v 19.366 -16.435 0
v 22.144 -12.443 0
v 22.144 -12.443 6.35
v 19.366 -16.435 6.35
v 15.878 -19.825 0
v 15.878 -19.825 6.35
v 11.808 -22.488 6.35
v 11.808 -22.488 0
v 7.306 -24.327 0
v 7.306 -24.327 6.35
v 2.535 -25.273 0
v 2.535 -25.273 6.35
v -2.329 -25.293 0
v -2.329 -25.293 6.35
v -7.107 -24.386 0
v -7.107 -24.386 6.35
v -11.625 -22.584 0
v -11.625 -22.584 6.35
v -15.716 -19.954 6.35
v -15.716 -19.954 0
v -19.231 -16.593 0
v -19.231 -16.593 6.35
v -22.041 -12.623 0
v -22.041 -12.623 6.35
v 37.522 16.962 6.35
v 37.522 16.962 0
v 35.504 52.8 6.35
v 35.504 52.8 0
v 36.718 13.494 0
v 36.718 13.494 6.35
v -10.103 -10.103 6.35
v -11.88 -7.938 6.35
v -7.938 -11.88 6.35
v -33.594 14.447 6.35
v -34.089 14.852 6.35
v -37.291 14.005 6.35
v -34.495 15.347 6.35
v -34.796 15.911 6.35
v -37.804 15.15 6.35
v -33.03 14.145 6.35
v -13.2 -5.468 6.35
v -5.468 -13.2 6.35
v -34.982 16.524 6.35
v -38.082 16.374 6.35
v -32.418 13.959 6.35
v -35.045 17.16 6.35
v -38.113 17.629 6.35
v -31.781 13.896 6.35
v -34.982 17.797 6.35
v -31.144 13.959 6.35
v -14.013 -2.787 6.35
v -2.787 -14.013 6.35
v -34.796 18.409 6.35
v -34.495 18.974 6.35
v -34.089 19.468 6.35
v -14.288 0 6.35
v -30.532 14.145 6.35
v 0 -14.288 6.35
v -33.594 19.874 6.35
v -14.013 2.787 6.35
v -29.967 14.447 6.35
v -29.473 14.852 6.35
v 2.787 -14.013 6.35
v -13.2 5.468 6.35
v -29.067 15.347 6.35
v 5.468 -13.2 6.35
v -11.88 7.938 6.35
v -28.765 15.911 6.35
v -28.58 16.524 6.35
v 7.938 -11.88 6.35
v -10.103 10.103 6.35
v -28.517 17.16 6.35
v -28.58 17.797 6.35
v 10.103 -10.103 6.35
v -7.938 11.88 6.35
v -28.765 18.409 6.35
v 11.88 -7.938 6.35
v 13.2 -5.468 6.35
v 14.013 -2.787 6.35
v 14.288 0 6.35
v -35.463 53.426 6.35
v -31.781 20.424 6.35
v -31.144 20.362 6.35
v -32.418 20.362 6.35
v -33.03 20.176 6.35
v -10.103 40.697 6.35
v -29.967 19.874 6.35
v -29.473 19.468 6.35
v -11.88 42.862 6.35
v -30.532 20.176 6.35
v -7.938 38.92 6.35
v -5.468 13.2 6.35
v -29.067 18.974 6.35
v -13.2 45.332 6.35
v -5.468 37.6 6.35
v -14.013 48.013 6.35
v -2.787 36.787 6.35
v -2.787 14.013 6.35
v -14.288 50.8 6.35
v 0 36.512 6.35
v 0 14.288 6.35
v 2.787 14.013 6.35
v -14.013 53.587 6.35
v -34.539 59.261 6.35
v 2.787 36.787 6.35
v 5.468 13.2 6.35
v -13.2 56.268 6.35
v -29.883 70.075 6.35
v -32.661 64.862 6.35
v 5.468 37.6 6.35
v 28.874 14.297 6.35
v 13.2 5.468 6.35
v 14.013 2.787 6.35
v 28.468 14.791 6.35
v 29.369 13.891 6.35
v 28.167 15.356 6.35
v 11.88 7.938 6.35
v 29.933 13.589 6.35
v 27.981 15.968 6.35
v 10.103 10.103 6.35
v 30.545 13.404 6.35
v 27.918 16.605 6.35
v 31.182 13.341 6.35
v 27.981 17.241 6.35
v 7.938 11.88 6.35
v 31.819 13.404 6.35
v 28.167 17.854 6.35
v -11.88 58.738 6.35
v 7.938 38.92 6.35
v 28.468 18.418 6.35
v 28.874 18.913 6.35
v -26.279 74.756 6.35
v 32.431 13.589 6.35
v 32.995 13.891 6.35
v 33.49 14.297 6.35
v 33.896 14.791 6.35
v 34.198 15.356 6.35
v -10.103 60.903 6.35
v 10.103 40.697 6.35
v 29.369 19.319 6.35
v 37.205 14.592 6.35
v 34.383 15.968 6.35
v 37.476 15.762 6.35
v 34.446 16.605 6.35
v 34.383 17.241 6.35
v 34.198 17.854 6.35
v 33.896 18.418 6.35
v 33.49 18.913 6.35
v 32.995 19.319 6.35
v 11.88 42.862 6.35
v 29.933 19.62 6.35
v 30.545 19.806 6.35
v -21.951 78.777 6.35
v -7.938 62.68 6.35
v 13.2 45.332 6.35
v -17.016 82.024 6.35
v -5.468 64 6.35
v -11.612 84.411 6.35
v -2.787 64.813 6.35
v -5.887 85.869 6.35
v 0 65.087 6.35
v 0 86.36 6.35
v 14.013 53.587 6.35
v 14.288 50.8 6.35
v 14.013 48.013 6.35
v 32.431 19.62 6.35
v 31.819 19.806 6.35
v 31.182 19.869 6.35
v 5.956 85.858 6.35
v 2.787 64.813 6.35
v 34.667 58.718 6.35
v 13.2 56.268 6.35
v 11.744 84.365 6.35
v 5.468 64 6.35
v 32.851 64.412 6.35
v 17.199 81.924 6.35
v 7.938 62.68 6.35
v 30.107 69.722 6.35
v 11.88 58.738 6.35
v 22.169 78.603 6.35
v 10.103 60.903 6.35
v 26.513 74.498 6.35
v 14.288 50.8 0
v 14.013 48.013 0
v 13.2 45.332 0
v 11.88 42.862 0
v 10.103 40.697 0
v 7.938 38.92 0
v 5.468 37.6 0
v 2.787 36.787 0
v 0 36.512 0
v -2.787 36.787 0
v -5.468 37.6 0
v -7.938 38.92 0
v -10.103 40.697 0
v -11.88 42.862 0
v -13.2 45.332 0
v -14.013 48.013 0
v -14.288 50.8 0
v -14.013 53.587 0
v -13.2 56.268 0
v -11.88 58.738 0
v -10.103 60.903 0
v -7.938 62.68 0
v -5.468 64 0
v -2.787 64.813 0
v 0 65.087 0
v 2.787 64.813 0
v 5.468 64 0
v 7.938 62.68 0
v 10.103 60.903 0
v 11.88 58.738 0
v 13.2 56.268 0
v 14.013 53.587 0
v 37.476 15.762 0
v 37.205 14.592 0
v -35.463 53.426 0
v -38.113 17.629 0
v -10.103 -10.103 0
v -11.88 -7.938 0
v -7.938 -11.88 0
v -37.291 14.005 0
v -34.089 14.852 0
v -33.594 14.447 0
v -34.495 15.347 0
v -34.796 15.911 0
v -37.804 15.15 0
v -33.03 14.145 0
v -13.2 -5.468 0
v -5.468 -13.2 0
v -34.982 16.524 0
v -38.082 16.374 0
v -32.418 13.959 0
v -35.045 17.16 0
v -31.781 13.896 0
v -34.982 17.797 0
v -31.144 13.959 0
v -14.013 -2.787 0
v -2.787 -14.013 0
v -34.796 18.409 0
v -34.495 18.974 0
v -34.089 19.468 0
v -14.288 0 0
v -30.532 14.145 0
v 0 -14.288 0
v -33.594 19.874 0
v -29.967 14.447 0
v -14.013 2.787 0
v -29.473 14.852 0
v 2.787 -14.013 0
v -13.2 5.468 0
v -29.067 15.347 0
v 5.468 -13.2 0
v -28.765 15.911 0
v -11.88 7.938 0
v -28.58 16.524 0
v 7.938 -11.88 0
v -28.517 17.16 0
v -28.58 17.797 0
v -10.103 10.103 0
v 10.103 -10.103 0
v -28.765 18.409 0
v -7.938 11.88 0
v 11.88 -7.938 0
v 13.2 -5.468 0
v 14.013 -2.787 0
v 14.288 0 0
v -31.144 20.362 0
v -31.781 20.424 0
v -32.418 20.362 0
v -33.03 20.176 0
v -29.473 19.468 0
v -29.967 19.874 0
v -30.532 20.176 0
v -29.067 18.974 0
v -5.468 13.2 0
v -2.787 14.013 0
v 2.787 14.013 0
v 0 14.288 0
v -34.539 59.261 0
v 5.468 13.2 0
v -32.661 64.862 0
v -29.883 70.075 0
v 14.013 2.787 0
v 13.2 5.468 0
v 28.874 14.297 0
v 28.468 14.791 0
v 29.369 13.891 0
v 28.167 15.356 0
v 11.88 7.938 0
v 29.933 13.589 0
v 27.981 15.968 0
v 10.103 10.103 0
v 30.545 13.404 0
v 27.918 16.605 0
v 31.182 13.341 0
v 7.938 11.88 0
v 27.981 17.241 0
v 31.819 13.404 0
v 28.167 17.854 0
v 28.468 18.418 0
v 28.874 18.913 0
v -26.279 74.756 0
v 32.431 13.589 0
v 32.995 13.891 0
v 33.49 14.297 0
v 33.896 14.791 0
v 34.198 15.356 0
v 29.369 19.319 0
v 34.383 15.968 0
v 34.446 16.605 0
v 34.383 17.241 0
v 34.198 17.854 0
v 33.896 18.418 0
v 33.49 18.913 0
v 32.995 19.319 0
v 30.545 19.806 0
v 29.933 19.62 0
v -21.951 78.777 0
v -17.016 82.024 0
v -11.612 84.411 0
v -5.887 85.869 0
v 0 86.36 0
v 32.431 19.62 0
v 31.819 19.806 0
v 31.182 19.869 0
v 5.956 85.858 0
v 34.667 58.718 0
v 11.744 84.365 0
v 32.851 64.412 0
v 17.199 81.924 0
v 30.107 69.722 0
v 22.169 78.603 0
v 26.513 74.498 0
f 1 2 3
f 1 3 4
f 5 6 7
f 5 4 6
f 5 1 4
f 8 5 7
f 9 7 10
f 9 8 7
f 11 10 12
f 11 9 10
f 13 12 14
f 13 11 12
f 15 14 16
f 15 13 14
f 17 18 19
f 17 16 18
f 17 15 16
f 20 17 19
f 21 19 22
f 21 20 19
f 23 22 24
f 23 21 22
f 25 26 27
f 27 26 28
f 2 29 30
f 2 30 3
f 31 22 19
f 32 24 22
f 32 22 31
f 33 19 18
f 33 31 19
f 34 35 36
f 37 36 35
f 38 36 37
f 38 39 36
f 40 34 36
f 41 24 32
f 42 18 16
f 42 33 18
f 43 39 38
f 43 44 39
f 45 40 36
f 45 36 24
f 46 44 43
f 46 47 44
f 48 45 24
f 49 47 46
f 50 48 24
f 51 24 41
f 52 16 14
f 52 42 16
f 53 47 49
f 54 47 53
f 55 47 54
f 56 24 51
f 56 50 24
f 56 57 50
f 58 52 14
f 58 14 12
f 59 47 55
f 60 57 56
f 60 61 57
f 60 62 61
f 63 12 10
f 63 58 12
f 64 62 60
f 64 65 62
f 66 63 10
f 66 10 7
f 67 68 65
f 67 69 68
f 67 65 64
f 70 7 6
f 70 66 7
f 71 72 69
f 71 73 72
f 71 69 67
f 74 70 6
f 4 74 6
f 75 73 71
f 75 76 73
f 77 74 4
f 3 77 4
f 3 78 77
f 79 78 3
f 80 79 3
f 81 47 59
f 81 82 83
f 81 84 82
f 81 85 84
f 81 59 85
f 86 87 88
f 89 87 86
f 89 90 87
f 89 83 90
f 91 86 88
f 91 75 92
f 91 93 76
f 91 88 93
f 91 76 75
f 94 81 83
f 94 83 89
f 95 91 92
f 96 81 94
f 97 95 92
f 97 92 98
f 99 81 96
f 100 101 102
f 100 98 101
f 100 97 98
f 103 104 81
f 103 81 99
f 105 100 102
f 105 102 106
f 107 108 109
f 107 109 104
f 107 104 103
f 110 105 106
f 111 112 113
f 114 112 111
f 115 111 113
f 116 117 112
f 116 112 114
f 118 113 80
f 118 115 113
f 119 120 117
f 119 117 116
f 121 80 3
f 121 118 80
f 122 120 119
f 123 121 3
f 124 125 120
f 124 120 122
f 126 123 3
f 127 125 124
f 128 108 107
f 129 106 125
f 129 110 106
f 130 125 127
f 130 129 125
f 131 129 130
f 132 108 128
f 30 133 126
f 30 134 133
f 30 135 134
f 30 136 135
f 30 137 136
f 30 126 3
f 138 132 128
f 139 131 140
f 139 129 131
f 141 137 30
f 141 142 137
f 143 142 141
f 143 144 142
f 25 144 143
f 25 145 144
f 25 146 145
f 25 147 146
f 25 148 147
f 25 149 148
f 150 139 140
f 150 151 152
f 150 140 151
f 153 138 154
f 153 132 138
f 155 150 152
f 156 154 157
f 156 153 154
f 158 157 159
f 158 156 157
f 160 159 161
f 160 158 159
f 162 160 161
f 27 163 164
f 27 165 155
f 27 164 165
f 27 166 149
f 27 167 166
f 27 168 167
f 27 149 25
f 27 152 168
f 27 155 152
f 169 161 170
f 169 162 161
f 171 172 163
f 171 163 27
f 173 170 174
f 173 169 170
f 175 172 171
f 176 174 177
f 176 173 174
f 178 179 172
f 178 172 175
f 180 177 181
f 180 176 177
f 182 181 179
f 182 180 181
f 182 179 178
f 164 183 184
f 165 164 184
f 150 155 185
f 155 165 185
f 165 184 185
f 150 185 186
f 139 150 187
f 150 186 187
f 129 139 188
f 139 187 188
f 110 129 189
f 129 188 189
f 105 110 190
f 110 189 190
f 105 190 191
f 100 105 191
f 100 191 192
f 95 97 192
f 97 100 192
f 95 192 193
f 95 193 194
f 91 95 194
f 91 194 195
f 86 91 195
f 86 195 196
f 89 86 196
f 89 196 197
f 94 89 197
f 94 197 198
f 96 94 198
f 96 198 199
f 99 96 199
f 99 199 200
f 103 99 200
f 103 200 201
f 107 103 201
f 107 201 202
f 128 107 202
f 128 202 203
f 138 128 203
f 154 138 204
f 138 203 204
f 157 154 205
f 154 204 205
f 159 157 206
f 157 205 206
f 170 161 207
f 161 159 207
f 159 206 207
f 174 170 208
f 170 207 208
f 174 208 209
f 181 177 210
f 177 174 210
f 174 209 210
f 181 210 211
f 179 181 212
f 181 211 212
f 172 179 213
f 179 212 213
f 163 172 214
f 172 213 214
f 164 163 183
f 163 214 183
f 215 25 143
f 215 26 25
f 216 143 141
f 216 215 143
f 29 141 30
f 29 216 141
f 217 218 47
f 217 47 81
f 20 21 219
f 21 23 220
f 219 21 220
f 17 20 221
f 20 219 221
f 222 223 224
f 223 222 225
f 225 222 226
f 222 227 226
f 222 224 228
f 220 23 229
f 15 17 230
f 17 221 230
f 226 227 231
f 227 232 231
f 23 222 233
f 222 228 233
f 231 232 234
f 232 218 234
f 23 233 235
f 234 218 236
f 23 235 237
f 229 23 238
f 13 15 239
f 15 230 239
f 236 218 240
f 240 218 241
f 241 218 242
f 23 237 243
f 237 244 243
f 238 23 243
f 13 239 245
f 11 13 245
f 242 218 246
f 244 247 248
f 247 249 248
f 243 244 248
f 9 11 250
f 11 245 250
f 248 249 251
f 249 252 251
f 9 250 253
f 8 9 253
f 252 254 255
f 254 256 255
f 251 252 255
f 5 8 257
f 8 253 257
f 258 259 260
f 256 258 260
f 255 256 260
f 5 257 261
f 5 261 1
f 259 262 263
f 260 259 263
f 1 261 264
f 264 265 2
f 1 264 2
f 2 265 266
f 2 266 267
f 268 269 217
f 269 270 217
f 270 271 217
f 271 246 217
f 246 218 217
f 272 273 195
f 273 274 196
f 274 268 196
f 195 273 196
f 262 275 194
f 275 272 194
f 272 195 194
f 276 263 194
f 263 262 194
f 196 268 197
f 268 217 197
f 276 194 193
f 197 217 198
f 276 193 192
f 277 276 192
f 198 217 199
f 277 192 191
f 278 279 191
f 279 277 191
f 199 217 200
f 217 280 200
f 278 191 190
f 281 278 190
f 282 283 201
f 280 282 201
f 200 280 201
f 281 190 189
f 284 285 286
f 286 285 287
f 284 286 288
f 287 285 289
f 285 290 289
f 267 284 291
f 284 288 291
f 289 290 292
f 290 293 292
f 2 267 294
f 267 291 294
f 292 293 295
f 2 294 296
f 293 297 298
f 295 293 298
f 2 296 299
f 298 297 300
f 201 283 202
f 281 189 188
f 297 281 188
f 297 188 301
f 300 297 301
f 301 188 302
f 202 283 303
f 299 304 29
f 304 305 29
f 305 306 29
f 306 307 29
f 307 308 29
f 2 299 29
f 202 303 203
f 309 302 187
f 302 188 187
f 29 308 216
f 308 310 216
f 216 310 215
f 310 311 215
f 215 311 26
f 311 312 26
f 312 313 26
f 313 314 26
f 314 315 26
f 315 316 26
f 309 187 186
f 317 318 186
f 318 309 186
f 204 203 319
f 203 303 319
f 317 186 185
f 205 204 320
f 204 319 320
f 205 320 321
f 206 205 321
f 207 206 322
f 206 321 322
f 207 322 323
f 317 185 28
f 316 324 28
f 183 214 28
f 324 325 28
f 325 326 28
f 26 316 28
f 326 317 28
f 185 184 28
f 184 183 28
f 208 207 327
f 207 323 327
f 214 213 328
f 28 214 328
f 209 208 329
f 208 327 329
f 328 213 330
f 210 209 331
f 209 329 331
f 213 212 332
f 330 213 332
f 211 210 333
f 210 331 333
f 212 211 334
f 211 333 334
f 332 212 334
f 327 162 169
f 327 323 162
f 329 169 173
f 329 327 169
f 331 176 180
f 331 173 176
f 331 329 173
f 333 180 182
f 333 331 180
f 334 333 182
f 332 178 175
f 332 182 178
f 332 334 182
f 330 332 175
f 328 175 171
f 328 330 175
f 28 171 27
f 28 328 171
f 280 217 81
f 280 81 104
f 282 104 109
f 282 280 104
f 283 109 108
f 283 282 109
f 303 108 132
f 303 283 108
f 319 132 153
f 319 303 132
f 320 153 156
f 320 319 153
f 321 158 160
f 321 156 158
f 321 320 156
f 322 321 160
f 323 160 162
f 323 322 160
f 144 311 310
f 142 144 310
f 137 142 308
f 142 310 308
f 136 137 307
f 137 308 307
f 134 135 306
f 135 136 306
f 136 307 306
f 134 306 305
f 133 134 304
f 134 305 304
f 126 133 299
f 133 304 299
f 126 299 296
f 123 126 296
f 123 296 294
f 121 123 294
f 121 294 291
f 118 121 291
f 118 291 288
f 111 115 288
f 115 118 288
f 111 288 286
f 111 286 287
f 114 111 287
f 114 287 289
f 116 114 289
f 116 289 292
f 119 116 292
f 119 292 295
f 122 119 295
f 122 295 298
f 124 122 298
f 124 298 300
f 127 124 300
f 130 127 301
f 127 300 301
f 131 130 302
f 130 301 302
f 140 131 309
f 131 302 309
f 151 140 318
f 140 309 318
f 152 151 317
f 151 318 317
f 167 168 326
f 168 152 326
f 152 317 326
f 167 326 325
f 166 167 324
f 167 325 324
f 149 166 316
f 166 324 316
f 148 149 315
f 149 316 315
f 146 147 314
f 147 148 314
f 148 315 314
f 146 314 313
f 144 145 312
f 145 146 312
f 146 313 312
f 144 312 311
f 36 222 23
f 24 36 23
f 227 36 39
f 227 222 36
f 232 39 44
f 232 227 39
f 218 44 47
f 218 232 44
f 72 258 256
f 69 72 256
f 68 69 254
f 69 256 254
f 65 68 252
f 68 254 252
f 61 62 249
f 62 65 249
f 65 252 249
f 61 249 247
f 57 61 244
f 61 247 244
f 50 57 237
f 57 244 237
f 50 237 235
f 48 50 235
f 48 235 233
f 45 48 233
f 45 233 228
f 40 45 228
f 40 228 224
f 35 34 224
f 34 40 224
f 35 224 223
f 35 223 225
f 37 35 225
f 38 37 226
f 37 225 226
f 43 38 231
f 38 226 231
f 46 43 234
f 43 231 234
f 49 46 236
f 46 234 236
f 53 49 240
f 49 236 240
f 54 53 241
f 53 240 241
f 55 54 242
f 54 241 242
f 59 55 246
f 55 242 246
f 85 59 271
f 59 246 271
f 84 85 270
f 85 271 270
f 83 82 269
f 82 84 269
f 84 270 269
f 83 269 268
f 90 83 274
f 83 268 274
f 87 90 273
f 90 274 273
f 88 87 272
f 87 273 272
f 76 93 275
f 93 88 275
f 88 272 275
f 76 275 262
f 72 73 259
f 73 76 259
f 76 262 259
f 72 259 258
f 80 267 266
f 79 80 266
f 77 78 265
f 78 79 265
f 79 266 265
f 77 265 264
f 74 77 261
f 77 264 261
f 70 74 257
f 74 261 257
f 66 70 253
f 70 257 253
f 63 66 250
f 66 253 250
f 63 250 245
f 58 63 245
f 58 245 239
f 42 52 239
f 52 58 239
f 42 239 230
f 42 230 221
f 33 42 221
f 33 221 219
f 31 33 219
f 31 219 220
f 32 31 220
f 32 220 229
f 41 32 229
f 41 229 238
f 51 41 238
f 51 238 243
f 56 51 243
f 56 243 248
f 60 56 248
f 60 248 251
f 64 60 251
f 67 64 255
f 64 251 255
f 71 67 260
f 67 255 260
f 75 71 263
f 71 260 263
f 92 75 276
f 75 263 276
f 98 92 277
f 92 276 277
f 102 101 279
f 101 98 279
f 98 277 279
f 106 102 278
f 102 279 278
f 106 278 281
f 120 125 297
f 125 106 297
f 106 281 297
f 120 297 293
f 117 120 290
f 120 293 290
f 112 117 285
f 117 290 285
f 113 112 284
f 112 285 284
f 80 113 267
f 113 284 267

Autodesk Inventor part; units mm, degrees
ref_plane "YZ Plane" through (0, 0, 0) normal (1, 0, 0) x (0, 1, 0)
ref_plane "XZ Plane" through (0, 0, 0) normal (0, 1, 0) x (-1, 0, 0)
ref_plane "XY Plane" through (0, 0, 0) normal (0, 0, 1) x (1, 0, 0)
sketch "Sketch1" plane through (0, 0, 0) normal (0, 0, 1) x (1, 0, 0)
  circle A0 centre (0, 0) radius 14.2875
  circle A1 centre (0, 0) radius 20.32 construction
  circle A2 centre (0, 50.8) radius 30.48 construction
  circle A3 centre (0, 50.8) radius 14.2875
  circle A4 centre (0, 50.8) radius 35.56 construction
  line L0 (0, 81.28) -> (0, 86.36)
  circle A5 centre (0, 0) radius 25.4 construction
  line L1 (0, 20.32) -> (0, 25.4) construction
  circle A6 centre (-31.7808, 17.1604) radius 6.35 construction
  circle A7 centre (31.1821, 16.6047) radius 6.35 construction
  line L2 (-27.42, 21.7763) -> (-24.4204, 24.9513) construction
  line L3 (-26.1933, 14.1434) -> (-22.3499, 12.0681) construction
  line L4 (26.8213, 11.9889) -> (23.8217, 8.8139) construction
  line L5 (26.9034, 21.2968) -> (23.9604, 24.5243) construction
  circle A8 centre (-31.7808, 17.1604) radius 3.2639
  circle A9 centre (31.1821, 16.6047) radius 3.2639
  line L6 (-37.2911, 14.0047) -> (-22.0413, -12.6231)
  line L7 (36.718, 13.494) -> (22.1435, -12.4429)
  line L8 (-38.1134, 17.6293) -> (-35.4629, 53.4258)
  line L9 (37.522, 16.9618) -> (35.5037, 52.7995)
  arc A10 (-38.1134, 17.6293) -> (-37.2911, 14.0047) centre (-31.7808, 17.1604) ccw
  arc A11 (36.718, 13.494) -> (37.522, 16.9618) centre (31.1821, 16.6047) ccw
  arc A12 (35.5037, 52.7995) -> (-35.4629, 53.4258) centre (0, 50.8) ccw
  arc A13 (-22.0413, -12.6231) -> (22.1435, -12.4429) centre (0, 0) ccw
  dimension "d1" = 40.64
  dimension "d0" = 28.575
  dimension "d2" = 60.96
  dimension "d3" = 28.575
  dimension "d4" = 5.08
  dimension "d5" = 71.12
  dimension "d6" = 5.08
  dimension "d9" = 12.7
  dimension "d10" = 3.175
  dimension "d11" = 6.5278
  dimension "d12" = 6.5278
extrude "Extrusion2" add sketch "Sketch1" along normal blind 6.35
properties part number "BottomPlate" material "Aluminum 6061"
